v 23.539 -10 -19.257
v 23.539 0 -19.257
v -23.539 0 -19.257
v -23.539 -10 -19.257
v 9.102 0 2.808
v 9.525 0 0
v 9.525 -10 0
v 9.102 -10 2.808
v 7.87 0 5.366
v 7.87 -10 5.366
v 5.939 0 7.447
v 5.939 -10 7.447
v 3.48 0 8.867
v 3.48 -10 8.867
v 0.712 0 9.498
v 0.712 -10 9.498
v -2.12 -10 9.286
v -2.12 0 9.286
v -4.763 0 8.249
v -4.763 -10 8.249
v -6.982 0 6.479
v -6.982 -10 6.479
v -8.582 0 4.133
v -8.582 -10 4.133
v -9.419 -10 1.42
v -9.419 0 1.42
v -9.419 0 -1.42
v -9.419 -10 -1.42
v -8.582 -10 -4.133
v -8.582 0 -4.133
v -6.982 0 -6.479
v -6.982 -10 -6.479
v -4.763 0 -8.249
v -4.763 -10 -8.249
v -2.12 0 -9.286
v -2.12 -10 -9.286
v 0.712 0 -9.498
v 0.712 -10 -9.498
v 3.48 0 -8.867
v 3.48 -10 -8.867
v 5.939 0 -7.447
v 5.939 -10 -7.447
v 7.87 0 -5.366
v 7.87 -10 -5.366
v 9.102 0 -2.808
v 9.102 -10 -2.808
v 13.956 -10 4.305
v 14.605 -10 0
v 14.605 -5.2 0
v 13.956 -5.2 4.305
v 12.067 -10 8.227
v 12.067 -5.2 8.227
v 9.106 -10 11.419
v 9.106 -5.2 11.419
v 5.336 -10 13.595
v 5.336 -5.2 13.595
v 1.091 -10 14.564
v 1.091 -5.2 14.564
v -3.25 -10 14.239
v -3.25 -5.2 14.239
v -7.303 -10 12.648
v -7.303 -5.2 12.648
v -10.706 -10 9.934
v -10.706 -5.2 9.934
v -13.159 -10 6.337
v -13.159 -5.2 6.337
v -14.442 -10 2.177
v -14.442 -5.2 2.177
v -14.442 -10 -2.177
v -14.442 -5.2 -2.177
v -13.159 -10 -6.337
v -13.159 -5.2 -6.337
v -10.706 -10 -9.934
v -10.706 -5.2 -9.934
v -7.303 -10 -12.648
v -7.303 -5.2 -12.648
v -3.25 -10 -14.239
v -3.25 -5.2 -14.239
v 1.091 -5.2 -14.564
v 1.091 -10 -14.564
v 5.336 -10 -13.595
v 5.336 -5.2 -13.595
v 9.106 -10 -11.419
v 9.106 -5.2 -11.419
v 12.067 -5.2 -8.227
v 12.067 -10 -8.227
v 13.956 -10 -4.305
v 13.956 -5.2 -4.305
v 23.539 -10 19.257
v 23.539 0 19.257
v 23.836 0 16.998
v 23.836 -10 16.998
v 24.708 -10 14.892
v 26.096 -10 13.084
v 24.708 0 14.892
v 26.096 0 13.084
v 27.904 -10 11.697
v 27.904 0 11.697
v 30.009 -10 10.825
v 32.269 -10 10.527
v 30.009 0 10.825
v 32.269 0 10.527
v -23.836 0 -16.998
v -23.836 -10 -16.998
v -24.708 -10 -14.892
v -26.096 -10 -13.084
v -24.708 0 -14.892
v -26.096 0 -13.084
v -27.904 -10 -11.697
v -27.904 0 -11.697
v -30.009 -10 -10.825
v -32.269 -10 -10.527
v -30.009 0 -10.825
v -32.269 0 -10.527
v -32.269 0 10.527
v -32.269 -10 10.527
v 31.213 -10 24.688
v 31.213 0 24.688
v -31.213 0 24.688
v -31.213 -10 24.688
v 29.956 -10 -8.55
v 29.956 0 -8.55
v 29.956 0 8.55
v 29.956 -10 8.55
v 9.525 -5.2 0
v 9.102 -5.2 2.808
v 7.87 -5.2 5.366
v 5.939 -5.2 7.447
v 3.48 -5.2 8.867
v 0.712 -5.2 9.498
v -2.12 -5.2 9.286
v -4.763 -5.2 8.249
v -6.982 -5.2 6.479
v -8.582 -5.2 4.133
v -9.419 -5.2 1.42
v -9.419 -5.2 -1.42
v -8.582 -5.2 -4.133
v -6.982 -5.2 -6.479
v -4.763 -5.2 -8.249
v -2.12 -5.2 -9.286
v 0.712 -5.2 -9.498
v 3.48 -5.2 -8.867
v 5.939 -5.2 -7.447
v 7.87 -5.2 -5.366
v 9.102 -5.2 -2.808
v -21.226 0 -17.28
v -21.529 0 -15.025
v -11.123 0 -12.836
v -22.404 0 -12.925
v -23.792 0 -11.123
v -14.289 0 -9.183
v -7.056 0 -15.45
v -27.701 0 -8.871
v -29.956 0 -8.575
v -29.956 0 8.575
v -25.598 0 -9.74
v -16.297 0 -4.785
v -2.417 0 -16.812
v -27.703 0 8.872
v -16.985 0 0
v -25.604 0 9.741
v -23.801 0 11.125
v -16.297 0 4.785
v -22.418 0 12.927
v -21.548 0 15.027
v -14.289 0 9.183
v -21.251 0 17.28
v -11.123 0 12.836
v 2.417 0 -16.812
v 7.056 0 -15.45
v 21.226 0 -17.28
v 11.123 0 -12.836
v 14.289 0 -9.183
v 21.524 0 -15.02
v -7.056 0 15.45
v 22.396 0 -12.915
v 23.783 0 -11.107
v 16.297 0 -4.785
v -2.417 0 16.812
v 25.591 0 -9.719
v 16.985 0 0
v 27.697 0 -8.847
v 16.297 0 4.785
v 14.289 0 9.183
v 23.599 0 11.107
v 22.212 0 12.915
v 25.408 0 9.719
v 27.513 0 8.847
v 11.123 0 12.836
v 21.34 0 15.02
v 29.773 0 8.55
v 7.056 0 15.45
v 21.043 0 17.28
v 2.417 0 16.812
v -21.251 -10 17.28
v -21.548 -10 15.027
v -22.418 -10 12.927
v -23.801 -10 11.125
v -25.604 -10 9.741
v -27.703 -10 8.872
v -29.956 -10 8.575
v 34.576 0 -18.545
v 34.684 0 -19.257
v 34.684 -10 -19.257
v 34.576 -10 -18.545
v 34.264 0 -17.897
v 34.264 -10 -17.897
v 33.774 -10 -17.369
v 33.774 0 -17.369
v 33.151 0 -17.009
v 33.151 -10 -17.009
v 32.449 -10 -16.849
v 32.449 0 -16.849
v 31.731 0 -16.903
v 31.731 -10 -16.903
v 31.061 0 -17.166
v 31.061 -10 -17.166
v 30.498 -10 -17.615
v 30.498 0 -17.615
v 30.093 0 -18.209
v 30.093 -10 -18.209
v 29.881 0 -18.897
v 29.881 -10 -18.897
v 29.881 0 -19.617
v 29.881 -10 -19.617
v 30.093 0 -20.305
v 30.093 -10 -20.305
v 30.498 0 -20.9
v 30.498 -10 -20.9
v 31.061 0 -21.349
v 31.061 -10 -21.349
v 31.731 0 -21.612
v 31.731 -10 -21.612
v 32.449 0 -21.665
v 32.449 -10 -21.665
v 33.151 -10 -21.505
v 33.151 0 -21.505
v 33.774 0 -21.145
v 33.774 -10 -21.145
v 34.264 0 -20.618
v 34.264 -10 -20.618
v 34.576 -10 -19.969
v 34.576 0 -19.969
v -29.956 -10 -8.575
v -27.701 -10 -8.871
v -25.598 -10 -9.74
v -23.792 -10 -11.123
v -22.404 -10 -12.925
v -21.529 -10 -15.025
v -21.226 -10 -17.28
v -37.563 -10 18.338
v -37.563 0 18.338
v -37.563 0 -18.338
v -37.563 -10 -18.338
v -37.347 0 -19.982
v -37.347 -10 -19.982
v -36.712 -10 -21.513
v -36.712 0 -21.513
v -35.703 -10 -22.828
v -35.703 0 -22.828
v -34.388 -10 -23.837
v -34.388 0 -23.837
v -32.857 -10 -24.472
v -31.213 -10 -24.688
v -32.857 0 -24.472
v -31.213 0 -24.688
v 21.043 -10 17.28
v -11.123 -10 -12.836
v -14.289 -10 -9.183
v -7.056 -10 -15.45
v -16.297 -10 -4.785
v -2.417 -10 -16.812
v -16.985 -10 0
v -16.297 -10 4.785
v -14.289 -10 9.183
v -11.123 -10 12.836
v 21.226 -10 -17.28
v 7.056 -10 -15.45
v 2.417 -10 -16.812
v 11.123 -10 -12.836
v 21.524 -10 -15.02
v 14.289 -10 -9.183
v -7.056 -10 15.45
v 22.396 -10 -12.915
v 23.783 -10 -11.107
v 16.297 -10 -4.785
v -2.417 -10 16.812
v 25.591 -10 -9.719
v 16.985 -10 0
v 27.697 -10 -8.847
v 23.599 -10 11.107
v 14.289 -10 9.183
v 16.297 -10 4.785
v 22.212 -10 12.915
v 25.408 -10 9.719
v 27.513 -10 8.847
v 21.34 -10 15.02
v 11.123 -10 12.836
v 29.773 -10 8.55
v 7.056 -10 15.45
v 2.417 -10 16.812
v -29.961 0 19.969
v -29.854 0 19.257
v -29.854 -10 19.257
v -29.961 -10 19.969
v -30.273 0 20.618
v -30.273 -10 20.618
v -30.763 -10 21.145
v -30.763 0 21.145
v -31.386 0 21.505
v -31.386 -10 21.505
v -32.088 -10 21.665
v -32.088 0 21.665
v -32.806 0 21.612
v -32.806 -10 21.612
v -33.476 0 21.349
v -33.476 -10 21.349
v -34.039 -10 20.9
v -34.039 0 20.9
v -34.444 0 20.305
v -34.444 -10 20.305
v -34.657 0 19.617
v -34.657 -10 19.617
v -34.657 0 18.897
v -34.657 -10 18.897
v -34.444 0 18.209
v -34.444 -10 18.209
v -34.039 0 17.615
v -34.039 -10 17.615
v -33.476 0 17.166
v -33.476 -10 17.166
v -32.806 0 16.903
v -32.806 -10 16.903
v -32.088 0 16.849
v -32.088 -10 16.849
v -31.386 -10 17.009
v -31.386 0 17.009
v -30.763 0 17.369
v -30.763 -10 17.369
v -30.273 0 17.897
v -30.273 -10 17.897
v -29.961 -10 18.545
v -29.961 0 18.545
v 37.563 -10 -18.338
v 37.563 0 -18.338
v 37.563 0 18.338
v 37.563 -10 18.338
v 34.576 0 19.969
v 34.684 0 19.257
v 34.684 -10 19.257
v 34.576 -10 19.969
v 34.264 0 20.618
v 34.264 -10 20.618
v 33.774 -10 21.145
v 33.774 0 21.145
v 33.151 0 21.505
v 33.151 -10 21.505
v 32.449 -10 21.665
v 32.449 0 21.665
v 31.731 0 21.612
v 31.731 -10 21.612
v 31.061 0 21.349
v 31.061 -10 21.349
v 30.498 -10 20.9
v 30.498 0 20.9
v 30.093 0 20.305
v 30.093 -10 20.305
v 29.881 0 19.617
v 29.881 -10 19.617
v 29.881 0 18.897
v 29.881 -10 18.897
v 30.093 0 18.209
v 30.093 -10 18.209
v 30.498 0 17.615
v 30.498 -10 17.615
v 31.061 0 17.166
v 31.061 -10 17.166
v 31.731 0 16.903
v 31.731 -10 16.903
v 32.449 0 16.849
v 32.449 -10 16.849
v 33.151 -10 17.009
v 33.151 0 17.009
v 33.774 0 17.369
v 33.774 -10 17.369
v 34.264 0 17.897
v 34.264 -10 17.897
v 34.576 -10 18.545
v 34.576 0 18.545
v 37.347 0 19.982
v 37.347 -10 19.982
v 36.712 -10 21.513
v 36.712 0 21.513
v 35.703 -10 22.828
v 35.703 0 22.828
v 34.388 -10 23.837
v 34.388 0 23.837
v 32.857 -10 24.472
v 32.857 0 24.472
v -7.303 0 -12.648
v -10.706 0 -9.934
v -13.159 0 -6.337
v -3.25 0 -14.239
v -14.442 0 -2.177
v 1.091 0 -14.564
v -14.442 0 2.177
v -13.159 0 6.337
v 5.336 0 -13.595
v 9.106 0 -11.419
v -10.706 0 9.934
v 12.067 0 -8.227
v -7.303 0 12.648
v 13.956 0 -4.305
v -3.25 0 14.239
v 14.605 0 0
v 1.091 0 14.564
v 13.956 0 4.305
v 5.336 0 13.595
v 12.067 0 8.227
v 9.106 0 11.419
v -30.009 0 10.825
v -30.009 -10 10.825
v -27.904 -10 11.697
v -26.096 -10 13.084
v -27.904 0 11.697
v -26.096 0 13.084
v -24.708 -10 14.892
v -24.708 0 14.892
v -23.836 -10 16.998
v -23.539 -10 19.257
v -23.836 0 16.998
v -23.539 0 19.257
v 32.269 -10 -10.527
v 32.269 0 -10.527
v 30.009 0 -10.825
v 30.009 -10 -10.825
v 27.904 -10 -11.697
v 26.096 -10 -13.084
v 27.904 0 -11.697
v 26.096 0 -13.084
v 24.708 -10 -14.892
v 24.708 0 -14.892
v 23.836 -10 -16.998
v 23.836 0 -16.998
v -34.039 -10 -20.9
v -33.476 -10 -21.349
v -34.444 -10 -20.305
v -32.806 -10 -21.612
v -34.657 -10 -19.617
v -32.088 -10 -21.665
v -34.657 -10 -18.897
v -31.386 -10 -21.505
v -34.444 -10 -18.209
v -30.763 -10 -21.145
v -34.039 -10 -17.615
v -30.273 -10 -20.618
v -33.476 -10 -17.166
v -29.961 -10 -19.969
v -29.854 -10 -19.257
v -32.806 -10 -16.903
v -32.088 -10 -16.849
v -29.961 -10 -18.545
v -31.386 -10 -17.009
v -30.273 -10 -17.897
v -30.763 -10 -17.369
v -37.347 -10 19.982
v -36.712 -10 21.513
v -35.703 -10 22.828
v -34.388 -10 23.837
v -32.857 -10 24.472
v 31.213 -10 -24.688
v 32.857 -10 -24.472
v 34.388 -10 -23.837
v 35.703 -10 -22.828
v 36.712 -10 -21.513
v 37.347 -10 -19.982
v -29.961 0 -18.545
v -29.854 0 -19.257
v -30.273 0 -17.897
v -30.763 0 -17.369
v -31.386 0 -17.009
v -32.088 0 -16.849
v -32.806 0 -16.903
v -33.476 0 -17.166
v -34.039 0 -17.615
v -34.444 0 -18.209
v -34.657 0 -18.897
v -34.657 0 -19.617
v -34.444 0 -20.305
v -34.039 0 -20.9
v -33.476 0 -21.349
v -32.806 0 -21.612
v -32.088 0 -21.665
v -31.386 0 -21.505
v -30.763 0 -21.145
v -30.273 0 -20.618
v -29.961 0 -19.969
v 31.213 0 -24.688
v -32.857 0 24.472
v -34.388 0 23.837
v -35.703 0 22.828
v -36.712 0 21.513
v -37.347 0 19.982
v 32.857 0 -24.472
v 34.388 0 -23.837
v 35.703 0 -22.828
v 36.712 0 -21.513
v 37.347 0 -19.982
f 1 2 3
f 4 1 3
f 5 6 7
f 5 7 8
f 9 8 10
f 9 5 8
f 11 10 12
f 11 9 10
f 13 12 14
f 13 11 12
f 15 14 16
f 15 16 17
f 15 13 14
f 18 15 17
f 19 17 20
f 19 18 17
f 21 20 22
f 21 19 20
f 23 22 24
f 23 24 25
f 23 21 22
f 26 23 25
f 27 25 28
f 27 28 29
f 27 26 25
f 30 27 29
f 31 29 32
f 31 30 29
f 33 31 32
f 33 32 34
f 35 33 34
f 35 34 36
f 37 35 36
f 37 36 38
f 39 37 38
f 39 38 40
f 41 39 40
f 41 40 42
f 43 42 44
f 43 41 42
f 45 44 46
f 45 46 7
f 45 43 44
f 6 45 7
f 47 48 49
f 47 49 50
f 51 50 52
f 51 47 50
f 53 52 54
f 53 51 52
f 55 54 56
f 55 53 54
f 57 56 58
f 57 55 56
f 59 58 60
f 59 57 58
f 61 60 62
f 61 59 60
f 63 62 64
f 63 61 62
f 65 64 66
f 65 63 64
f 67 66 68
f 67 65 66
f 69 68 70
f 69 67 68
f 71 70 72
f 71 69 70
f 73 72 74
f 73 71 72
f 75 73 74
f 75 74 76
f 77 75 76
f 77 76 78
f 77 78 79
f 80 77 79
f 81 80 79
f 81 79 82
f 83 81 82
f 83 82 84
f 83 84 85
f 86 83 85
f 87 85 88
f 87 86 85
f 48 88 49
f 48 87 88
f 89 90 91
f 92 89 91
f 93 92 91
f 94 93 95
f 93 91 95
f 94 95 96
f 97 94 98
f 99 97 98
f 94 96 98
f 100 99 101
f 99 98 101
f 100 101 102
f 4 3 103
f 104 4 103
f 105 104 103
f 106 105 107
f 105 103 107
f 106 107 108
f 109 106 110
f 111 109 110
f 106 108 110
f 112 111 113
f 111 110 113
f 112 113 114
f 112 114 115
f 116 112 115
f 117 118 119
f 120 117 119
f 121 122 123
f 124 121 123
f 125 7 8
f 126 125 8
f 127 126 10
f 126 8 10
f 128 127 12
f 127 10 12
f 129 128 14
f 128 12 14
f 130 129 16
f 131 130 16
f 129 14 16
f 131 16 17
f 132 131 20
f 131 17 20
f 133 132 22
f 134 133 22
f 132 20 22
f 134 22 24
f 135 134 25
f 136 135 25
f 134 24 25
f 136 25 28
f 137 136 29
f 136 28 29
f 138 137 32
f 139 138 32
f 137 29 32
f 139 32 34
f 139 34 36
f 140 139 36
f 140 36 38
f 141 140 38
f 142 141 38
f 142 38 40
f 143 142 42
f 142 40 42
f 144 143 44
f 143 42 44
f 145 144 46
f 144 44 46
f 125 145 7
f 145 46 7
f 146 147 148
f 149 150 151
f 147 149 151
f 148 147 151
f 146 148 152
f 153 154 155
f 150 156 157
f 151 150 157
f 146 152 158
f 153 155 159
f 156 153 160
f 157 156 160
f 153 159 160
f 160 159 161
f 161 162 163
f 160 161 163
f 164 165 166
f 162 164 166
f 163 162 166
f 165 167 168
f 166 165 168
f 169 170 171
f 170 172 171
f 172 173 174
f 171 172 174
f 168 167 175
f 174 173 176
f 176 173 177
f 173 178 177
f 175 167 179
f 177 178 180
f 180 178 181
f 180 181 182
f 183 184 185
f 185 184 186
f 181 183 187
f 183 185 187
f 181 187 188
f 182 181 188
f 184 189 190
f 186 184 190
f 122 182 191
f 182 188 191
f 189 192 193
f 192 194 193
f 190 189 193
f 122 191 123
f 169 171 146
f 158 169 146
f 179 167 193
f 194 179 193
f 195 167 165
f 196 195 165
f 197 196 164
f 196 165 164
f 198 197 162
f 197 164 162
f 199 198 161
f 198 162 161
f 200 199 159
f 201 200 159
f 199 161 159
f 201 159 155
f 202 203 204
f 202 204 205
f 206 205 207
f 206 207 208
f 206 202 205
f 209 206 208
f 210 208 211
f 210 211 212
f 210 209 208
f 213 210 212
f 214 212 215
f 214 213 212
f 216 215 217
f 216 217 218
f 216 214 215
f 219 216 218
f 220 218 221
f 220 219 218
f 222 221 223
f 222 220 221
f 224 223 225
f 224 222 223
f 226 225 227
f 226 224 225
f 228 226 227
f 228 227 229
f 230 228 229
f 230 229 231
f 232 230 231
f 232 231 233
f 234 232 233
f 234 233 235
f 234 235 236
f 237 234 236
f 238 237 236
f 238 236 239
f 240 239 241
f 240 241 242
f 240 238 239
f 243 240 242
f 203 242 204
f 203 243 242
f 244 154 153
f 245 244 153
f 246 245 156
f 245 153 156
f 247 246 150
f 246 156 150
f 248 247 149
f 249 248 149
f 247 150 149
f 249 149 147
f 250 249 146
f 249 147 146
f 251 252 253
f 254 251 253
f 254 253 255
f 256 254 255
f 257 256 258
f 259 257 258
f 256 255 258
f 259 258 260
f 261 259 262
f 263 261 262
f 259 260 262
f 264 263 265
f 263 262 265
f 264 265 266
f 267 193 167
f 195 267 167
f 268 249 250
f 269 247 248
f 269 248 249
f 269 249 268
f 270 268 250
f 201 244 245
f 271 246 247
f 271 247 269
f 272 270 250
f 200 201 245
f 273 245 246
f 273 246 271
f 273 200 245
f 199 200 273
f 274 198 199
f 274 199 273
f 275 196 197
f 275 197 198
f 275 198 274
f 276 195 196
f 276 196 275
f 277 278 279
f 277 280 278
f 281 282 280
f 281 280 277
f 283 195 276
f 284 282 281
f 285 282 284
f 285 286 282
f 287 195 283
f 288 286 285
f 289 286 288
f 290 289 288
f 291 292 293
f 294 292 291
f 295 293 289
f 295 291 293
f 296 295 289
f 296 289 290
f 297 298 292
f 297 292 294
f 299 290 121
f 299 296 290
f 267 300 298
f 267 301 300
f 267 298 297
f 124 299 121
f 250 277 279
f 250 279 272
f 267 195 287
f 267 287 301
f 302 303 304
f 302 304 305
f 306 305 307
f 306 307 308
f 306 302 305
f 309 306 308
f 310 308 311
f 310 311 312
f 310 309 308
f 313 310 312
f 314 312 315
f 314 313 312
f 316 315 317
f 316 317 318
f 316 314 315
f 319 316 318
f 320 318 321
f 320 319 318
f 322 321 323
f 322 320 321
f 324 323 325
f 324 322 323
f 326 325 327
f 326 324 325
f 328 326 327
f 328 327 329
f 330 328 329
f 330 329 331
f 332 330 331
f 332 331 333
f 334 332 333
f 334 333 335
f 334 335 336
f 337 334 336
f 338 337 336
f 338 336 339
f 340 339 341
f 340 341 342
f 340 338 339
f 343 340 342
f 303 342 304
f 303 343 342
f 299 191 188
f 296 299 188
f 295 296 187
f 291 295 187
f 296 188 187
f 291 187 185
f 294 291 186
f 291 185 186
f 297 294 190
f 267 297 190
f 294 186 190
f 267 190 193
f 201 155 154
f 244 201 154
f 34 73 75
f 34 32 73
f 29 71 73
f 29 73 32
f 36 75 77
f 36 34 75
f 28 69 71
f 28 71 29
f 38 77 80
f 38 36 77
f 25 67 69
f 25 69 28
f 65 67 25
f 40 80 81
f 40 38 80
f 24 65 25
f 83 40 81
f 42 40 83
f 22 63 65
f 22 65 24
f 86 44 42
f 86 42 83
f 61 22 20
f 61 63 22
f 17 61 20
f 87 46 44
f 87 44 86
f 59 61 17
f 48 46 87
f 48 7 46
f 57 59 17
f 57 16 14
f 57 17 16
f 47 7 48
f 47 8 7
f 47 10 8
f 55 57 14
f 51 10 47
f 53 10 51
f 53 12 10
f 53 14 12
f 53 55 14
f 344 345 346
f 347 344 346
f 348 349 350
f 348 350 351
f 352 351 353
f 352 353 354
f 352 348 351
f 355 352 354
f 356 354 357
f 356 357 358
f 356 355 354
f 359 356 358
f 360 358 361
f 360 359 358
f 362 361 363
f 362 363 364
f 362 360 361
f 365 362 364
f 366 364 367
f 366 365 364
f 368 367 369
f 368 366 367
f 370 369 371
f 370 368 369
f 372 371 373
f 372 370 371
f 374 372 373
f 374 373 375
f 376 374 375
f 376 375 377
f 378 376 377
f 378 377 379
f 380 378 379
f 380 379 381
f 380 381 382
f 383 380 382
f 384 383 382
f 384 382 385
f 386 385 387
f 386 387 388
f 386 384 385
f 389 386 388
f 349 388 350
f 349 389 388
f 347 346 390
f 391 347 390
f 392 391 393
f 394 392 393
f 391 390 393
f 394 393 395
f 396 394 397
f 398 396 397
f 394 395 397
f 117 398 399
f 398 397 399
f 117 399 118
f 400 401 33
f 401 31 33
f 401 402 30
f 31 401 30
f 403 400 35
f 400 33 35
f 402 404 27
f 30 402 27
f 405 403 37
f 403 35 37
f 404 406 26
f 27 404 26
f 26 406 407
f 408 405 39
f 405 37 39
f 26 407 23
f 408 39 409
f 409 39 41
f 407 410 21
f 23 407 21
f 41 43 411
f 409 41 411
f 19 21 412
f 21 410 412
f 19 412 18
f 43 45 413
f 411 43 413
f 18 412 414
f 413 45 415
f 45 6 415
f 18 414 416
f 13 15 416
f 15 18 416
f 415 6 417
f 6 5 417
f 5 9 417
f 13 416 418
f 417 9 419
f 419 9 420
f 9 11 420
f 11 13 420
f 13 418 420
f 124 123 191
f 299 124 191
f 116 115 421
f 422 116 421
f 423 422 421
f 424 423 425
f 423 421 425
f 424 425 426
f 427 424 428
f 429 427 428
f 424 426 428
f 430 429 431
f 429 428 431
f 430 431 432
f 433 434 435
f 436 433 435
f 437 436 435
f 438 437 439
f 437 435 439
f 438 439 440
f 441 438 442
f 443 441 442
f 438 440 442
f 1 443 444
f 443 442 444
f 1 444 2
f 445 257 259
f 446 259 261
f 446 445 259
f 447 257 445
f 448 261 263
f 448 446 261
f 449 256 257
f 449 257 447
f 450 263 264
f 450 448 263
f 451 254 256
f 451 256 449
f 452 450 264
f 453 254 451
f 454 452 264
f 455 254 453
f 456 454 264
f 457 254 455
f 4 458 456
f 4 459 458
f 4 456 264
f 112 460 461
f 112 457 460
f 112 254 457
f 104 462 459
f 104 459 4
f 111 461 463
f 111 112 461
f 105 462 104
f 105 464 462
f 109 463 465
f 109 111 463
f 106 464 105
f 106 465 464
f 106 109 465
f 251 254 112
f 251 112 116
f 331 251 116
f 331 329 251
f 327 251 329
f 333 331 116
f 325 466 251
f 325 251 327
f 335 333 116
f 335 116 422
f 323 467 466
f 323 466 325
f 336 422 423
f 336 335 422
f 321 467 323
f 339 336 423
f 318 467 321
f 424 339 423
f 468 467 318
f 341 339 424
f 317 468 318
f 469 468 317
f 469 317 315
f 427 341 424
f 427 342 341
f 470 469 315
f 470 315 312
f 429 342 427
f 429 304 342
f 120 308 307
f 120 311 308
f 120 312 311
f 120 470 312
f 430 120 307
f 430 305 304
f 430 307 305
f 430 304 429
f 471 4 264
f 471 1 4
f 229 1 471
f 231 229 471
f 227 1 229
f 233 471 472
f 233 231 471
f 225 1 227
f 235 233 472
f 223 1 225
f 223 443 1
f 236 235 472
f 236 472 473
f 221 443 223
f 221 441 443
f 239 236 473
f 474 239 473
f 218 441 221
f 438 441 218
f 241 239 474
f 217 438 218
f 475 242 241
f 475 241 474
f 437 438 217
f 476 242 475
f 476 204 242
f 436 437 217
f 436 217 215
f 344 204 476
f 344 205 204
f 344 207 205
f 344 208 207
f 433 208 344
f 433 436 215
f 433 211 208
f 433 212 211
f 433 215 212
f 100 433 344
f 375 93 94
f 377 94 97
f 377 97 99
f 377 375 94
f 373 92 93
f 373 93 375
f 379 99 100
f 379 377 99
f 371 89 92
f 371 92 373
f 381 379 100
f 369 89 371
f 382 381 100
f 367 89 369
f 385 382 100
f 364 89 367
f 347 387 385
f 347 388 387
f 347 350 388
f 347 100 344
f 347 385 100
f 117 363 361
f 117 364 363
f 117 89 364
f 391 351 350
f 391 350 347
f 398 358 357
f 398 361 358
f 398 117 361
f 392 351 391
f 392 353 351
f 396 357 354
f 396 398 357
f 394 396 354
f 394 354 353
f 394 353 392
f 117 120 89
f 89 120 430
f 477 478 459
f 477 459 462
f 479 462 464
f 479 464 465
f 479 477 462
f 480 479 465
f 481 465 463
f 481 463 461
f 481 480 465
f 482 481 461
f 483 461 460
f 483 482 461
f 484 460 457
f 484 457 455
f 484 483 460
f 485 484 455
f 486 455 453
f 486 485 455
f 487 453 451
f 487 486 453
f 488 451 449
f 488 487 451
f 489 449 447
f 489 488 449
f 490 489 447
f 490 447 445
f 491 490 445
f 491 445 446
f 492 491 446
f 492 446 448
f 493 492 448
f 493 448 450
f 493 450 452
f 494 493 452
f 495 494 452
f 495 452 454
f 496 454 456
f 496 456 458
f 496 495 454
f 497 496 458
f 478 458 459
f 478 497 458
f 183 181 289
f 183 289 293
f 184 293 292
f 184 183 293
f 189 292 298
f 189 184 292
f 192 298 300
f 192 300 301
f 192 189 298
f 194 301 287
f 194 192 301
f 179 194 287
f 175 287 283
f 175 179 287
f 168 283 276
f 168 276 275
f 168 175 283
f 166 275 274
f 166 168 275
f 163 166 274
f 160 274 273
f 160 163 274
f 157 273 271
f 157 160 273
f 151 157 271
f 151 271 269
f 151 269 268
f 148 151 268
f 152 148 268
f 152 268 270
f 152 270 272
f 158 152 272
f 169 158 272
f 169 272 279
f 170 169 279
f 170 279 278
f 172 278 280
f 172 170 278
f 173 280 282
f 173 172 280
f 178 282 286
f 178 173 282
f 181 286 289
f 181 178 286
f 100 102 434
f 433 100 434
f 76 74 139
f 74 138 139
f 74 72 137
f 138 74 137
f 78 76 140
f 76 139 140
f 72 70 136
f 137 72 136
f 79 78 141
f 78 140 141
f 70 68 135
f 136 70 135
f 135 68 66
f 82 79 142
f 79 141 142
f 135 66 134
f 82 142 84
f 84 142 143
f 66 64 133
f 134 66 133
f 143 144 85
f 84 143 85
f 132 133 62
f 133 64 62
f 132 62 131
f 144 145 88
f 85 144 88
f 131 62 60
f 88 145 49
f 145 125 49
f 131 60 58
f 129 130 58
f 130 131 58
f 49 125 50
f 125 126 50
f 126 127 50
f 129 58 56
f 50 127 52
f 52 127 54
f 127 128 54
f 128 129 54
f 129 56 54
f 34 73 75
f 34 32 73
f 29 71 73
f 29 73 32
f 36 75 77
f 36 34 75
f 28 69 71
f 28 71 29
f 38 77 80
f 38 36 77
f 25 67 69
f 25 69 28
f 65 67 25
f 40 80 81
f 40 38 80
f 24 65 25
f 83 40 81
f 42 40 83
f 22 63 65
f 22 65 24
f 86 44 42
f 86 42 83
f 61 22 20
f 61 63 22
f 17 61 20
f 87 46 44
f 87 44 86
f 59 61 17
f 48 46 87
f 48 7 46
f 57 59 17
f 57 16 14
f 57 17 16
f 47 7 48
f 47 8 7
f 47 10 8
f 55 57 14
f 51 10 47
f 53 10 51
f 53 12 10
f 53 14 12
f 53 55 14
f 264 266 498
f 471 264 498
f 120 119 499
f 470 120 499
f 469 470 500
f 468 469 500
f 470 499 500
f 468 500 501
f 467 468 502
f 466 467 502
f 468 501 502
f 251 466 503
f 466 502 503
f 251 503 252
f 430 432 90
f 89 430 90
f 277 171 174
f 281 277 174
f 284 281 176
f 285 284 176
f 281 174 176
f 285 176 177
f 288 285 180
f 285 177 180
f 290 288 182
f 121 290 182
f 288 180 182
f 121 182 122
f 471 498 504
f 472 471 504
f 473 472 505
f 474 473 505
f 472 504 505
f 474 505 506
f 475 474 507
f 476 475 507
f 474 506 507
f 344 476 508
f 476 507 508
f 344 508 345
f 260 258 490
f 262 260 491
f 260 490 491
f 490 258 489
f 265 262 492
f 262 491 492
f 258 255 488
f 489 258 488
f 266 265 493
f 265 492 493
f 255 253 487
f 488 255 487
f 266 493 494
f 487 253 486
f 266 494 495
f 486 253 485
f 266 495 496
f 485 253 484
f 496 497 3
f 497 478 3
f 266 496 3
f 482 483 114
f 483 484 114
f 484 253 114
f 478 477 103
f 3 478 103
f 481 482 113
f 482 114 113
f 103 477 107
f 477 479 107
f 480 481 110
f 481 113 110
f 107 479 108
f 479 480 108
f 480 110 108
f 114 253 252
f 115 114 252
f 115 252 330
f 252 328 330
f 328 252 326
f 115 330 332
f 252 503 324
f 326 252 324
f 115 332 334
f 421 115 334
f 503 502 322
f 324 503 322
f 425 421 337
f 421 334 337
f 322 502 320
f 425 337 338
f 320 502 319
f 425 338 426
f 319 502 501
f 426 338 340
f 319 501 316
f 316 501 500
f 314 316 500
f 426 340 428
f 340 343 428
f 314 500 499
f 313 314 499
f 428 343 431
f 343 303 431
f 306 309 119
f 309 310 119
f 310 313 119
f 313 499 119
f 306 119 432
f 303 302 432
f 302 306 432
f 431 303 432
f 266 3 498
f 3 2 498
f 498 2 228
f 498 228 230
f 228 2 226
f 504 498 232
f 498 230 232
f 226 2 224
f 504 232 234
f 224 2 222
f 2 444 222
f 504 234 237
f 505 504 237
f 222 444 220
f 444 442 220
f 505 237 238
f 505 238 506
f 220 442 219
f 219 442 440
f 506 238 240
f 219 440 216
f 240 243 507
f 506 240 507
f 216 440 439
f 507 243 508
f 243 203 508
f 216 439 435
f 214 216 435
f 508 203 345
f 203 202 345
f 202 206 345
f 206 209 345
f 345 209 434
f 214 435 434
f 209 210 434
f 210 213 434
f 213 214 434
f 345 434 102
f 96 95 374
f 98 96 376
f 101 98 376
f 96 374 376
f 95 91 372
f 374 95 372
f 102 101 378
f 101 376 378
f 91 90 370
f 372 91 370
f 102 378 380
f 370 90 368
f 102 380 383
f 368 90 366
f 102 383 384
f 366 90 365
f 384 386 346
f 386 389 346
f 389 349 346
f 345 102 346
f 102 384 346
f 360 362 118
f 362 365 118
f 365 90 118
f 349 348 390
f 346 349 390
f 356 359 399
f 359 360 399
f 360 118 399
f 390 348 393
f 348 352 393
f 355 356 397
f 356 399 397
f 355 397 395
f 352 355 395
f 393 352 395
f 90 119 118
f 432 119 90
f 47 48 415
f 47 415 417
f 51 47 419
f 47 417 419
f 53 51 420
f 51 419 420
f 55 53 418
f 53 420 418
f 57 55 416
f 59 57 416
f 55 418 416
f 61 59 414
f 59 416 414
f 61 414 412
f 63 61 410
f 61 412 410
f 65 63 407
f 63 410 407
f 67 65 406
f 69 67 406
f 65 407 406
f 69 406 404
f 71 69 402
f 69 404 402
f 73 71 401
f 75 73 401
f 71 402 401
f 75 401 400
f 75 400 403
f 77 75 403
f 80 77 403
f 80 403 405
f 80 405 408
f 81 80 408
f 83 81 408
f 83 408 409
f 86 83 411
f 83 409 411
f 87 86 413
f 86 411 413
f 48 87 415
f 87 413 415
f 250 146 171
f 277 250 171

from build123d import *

# Parameters (mm, degrees)
F0_R     = 16.985
F1_DEPTH = 10
F0_R_2   = 14.605
F0_R_3   = 9.525
F2_DEPTH = 4.8
F0_R_4   = 2.415
F3_DEPTH = 10


# Not quite as in the source:
# - ends of sketch curves that miss each other by under 0.0002 mm in the source are joined


with BuildPart() as f1:
    # F0 (on Front) → F1 (new body)
    with BuildSketch(Plane.XZ):
        with BuildLine():
            Line((-21.2260876428, -17.2796698886), (21.2260876428, -17.2796698886))
            ThreePointArc((21.2260876428, -17.2796698886), (23.783045443, -11.1066276889), (29.9560876428, -8.5496698886))
            Line((29.9560876428, -8.5496698886), (29.9560876428, 8.5496698886))
            Line((29.9560876428, 8.5496698886), (29.7725021094, 8.5496698886))
            ThreePointArc((29.7725021094, 8.5496698886), (23.5994599096, 11.1066276889), (21.0425021094, 17.2796698886))
            Line((21.0425021094, 17.2796698886), (-21.2514177542, 17.2796698886))
            ThreePointArc((-21.2514177542, 17.2796698886), (-23.8009565366, 11.1245387824), (-29.9560876428, 8.575))
            Line((-29.9560876428, 8.575), (-29.9560876428, -8.575))
            ThreePointArc((-29.9560876428, -8.575), (-23.7920074576, -11.1230087778), (-21.2260876428, -17.2796698886))
        make_face()
        Circle(F0_R, mode=Mode.SUBTRACT)
    extrude(amount=F1_DEPTH)


with BuildPart() as f1b:
    # F0 (on Front) → F1, piece 2 (new body)
    with BuildSketch(Plane.XZ):
        Circle(F0_R_2)
        Circle(F0_R_3, mode=Mode.SUBTRACT)
    extrude(amount=F1_DEPTH)


with BuildPart() as f2:
    # F2 (new): a face of the model
    f2_faces = [f1b.part.faces().sort_by_distance(p)[0] for p in [
        (-14.1919082184, -10, 0),
    ]]
    extrude(f2_faces, amount=-F2_DEPTH)


with BuildPart() as f3:
    # F0 (on Front) → F3 (new body)
    with BuildSketch(Plane.XZ):
        with BuildLine():
            Line((31.2130296767, 24.6882159263), (-31.2130296767, 24.6882159263))
            ThreePointArc((-31.2130296767, 24.6882159263), (-35.7031577372, 22.8283439868), (-37.5630296767, 18.3382159263))
            Line((-37.5630296767, 18.3382159263), (-37.5630296767, -18.3382159263))
            ThreePointArc((-37.5630296767, -18.3382159263), (-35.7031577372, -22.8283439868), (-31.2130296767, -24.6882159263))
            Line((-31.2130296767, -24.6882159263), (31.2130296767, -24.6882159263))
            ThreePointArc((31.2130296767, -24.6882159263), (35.7031577372, -22.8283439868), (37.5630296767, -18.3382159263))
            Line((37.5630296767, -18.3382159263), (37.5630296767, 18.3382159263))
            ThreePointArc((37.5630296767, 18.3382159263), (35.7031577372, 22.8283439868), (31.2130296767, 24.6882159263))
        make_face()
        with Locations((-32.2686284781, -19.2572141065)):
            Circle(F0_R_4, mode=Mode.SUBTRACT)
        with Locations((32.2686284781, -19.2572141065)):
            Circle(F0_R_4, mode=Mode.SUBTRACT)
        with Locations((-32.2686284781, 19.2572141065)):
            Circle(F0_R_4, mode=Mode.SUBTRACT)
        with BuildLine():
            ThreePointArc((32.2686284781, -10.5272141065), (26.0955862783, -13.0841719068), (23.5386284781, -19.2572141065))
            Line((23.5386284781, -19.2572141065), (-23.5386284781, -19.2572141065))
            ThreePointArc((-23.5386284781, -19.2572141065), (-26.0955862783, -13.0841719068), (-32.2686284781, -10.5272141065))
            Line((-32.2686284781, -10.5272141065), (-32.2686284781, 10.5272141065))
            ThreePointArc((-32.2686284781, 10.5272141065), (-26.0955862783, 13.0841719068), (-23.5386284781, 19.2572141065))
            Line((-23.5386284781, 19.2572141065), (23.5386284781, 19.2572141065))
            ThreePointArc((23.5386284781, 19.2572141065), (26.0955862783, 13.0841719068), (32.2686284781, 10.5272141065))
            Line((32.2686284781, 10.5272141065), (32.2686284781, -10.5272141065))
        make_face(mode=Mode.SUBTRACT)
        with Locations((32.2686284781, 19.2572141065)):
            Circle(F0_R_4, mode=Mode.SUBTRACT)
    extrude(amount=F3_DEPTH)


solid = Compound([f1.part, f1b.part, f2.part, f3.part])
